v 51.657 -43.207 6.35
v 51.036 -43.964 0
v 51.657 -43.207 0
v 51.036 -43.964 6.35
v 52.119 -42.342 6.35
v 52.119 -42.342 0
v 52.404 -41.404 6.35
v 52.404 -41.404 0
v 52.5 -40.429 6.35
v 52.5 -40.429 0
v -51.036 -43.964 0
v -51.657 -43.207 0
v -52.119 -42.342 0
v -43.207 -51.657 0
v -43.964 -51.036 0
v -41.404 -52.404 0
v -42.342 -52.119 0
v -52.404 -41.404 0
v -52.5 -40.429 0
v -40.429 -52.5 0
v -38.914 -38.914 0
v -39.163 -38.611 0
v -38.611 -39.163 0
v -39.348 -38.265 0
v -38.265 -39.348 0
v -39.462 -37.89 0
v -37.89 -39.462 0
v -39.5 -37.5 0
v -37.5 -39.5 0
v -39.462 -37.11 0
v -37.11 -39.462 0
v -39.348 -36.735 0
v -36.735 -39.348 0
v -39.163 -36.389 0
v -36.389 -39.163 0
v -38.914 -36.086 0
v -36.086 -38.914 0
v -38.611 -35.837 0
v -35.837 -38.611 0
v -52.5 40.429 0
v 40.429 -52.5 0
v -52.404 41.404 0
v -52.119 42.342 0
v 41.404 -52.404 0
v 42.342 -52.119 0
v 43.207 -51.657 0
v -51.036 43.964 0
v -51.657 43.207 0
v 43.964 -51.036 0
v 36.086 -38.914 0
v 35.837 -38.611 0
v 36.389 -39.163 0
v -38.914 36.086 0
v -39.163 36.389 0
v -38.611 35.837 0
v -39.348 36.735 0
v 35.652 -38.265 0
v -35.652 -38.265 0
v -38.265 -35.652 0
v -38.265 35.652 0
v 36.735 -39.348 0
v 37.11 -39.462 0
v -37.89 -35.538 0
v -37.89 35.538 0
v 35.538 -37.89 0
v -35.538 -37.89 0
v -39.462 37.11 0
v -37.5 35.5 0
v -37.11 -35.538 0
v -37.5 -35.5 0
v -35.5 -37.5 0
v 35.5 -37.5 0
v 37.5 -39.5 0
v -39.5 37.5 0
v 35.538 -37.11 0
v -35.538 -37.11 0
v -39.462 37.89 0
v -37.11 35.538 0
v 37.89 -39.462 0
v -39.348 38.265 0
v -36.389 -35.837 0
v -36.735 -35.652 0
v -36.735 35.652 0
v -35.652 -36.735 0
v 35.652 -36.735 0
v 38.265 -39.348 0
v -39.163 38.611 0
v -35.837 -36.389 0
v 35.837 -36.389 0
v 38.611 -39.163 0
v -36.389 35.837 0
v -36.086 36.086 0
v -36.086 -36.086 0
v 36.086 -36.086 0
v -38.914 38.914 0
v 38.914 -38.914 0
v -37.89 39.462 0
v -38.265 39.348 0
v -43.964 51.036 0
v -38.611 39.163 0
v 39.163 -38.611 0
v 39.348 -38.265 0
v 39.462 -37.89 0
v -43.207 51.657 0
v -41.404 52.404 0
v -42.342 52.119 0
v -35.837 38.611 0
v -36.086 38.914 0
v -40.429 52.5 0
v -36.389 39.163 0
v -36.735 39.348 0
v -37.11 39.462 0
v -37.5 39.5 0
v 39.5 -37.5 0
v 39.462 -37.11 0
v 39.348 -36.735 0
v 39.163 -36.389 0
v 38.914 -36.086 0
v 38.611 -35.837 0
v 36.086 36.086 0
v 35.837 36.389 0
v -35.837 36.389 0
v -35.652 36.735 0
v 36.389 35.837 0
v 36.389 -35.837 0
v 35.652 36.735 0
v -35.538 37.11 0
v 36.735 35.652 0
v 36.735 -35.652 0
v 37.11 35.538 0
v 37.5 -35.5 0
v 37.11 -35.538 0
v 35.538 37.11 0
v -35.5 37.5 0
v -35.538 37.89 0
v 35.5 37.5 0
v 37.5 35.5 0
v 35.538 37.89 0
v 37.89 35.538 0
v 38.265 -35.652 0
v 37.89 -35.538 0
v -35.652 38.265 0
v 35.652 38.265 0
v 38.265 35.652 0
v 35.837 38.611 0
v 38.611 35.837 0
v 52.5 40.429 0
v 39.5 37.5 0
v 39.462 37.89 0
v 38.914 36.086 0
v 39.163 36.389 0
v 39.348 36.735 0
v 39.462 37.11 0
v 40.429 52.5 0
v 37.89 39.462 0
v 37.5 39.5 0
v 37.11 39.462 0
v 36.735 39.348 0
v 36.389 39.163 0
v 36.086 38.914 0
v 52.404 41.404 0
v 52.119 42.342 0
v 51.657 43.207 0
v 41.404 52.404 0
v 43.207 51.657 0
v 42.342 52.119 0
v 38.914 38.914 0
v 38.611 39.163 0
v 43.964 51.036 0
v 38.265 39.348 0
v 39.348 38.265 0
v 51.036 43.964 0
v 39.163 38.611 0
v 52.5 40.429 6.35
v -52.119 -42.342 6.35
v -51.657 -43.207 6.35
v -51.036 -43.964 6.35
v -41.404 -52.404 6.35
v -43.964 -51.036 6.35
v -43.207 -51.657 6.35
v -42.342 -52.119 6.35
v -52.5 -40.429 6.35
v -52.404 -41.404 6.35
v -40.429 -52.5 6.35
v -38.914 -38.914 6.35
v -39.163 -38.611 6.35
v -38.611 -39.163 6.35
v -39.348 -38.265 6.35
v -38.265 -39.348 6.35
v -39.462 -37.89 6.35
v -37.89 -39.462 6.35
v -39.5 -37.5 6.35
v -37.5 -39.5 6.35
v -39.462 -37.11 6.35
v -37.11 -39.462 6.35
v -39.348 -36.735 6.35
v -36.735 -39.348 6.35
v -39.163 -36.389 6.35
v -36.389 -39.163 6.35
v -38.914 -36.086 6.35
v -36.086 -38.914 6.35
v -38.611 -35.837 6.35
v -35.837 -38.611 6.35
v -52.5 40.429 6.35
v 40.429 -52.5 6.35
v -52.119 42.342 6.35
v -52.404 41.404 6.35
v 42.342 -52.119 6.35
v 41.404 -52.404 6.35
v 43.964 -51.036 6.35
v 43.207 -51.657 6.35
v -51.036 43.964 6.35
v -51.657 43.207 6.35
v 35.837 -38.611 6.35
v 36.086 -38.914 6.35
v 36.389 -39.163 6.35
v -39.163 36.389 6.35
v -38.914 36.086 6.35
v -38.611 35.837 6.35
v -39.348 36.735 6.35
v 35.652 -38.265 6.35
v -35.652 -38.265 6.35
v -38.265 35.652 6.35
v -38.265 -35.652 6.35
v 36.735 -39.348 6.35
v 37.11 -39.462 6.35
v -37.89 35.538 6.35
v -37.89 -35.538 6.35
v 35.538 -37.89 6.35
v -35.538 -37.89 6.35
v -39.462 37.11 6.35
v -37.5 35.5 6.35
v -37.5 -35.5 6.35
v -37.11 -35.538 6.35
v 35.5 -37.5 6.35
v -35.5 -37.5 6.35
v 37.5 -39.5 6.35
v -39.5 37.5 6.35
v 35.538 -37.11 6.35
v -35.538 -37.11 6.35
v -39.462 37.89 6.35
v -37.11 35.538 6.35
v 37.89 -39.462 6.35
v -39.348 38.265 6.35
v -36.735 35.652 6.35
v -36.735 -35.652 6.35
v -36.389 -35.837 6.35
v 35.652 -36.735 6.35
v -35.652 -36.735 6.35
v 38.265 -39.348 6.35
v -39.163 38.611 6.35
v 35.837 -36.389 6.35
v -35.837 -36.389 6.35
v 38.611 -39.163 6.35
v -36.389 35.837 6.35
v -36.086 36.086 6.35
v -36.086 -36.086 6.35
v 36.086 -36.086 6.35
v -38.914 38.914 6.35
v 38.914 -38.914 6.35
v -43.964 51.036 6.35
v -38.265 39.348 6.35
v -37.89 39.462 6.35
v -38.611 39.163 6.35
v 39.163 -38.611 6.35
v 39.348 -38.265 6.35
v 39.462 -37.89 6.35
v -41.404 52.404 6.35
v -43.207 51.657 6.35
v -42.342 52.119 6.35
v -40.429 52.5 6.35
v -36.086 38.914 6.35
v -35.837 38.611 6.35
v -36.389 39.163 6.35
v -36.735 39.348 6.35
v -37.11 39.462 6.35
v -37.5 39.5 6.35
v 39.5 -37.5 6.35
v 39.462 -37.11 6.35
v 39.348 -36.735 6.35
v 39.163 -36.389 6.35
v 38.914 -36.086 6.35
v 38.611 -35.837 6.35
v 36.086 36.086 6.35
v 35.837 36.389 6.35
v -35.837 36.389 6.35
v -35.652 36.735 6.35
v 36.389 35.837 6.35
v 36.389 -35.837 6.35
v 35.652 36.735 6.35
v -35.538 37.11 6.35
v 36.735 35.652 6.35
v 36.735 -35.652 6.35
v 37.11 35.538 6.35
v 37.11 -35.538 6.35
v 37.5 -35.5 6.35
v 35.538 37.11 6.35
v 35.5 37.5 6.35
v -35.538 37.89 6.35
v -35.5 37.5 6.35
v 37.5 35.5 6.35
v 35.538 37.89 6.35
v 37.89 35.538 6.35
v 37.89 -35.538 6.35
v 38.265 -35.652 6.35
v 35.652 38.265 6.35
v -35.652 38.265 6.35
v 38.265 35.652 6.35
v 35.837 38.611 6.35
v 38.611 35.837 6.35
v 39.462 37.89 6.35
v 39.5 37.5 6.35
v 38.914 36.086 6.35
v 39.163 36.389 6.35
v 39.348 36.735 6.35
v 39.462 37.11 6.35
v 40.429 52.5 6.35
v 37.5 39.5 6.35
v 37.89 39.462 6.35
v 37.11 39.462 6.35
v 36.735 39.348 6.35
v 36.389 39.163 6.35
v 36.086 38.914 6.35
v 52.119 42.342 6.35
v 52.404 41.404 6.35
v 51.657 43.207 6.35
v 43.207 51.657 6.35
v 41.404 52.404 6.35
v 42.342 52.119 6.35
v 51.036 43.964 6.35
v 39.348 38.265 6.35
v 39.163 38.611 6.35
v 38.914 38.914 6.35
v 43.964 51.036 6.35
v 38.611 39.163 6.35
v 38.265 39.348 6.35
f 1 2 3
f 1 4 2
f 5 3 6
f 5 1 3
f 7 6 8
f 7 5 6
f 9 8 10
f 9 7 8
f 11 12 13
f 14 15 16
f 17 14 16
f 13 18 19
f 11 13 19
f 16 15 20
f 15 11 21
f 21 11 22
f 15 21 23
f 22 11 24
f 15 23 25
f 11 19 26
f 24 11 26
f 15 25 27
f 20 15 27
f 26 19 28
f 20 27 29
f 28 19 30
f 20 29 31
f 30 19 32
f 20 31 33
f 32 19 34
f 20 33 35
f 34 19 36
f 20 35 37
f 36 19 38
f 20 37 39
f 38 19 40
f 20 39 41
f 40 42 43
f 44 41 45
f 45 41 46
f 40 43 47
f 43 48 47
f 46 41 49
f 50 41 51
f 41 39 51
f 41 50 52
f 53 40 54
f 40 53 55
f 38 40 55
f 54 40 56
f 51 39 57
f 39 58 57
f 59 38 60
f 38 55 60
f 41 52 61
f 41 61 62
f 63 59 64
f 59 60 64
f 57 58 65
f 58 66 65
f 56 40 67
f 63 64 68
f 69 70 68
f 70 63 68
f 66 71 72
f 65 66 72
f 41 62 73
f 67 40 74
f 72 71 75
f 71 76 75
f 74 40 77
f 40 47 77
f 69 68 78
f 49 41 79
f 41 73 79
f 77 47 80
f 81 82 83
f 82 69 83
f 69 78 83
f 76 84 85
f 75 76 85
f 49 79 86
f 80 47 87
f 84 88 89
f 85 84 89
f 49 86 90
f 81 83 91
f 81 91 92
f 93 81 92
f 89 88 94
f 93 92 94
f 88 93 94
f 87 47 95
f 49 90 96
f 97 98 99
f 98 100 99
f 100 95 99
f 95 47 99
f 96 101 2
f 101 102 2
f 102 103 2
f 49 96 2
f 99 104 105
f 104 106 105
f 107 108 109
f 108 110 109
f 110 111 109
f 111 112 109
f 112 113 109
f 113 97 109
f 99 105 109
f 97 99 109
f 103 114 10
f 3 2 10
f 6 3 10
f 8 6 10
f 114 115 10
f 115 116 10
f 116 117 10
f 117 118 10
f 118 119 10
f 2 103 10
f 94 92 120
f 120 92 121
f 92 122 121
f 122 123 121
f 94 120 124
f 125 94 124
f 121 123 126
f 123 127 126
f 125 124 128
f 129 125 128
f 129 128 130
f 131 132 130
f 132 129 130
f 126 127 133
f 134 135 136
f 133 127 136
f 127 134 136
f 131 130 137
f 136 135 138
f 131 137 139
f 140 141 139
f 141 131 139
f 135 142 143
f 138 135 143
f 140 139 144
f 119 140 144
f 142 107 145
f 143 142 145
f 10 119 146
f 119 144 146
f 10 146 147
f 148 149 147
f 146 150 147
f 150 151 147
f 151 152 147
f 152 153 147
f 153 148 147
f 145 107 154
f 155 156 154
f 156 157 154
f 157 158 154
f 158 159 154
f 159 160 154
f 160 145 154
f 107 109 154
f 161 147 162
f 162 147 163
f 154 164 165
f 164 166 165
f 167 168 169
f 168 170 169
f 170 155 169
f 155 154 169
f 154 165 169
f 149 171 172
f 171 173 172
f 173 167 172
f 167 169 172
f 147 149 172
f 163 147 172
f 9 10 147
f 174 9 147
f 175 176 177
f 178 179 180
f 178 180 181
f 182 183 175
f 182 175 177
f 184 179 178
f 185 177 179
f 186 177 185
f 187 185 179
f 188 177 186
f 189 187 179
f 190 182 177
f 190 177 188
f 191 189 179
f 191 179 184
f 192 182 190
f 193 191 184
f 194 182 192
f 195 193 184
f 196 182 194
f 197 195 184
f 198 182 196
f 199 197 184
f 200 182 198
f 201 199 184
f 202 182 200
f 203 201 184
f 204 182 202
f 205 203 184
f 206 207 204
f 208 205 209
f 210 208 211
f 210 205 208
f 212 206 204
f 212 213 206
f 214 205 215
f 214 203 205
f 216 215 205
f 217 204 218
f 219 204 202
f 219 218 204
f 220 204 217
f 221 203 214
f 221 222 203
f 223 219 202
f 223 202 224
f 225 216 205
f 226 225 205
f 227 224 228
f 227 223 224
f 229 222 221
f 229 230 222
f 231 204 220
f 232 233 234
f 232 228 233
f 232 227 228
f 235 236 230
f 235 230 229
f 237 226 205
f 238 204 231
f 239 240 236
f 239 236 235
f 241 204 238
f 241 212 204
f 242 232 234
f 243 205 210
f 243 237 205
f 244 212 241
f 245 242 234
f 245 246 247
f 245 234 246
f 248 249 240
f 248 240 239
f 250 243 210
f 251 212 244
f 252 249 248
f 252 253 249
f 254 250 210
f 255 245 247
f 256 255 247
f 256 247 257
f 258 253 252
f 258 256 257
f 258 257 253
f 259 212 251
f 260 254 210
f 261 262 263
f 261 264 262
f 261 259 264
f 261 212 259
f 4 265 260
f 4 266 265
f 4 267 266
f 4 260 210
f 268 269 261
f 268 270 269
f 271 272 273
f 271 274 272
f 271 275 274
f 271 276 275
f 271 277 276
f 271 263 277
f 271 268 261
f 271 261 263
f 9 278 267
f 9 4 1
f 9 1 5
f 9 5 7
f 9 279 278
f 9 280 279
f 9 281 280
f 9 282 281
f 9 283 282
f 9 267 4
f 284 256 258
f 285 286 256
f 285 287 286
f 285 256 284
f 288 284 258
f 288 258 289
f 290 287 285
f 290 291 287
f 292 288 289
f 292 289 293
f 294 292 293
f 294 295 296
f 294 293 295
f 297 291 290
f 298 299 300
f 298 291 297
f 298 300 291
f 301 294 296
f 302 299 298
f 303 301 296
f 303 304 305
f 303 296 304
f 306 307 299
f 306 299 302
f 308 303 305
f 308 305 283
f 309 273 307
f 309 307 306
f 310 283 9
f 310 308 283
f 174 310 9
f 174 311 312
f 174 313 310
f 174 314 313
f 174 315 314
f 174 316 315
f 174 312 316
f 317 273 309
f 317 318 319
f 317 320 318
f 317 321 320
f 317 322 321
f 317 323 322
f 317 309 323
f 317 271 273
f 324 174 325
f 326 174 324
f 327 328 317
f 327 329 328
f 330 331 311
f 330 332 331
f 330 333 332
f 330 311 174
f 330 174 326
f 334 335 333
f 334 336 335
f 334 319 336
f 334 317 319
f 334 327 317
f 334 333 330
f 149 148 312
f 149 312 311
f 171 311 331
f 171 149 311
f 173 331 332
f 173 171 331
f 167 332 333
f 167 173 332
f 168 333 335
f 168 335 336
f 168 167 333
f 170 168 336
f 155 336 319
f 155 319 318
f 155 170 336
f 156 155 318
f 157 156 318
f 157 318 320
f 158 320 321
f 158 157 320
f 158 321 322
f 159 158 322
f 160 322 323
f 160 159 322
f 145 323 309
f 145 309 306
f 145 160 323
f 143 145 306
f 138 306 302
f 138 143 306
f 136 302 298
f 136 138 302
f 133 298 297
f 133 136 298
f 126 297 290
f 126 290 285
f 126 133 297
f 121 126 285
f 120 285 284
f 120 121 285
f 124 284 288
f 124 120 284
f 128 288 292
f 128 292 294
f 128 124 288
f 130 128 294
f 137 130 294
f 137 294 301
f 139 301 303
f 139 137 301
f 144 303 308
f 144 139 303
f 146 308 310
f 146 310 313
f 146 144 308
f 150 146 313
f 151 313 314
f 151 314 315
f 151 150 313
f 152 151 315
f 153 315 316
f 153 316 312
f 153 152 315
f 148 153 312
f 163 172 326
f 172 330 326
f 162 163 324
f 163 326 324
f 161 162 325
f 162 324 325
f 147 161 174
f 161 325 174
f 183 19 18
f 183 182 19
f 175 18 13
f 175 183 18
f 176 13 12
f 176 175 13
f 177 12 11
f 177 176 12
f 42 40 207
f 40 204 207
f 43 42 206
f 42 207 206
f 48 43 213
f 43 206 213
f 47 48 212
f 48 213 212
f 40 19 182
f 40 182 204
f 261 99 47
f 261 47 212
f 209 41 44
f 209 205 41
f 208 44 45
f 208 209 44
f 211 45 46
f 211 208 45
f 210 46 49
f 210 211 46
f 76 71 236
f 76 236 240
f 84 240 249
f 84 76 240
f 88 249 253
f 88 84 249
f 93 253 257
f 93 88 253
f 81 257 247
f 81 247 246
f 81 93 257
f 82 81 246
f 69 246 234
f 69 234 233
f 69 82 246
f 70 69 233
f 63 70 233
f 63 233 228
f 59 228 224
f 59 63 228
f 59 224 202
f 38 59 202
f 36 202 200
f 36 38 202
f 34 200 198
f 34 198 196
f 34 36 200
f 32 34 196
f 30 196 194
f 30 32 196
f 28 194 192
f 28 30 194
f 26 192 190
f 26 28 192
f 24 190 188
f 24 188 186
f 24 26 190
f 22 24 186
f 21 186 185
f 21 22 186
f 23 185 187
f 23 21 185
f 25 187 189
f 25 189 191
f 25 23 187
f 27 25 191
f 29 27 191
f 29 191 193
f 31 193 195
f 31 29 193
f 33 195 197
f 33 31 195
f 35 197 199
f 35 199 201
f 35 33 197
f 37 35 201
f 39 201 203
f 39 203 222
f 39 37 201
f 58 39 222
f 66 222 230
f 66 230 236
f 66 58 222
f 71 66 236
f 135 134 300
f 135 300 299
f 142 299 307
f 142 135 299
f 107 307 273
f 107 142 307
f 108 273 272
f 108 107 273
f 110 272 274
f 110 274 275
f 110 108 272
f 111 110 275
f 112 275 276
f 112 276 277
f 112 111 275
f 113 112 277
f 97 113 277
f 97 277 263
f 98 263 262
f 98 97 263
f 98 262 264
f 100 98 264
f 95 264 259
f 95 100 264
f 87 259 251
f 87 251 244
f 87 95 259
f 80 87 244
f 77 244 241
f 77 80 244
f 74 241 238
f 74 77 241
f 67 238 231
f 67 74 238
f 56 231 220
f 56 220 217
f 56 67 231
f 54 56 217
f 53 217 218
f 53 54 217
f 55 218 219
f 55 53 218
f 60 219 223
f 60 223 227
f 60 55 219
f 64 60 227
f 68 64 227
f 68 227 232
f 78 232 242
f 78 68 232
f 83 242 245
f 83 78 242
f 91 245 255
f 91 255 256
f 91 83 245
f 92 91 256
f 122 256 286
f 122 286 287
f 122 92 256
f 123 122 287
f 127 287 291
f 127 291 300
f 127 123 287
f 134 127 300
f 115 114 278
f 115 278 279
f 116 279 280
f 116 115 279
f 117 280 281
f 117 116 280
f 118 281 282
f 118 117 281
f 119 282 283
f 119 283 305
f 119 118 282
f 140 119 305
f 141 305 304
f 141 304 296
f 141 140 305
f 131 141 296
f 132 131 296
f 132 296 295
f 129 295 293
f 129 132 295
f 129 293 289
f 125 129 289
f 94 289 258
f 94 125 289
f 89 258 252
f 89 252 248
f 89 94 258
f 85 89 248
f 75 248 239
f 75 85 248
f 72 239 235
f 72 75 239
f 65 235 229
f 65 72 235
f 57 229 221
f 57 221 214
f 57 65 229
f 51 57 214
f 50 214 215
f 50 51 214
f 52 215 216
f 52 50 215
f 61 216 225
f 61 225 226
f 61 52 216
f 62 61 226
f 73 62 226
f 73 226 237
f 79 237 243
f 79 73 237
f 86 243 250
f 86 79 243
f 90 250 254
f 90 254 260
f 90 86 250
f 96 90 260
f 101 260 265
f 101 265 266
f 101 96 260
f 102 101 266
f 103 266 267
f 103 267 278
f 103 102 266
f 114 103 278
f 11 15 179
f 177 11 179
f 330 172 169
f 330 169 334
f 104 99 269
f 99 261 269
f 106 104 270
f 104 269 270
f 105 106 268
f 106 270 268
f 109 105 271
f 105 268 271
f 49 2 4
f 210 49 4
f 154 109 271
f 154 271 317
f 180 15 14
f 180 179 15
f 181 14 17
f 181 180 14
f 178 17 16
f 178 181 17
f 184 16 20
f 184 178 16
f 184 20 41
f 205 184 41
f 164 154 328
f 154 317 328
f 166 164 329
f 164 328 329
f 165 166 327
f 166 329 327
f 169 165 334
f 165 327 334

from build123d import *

# Parameters (mm, degrees)
F0_W     = 105
F0_H     = 105
F0_R     = 2
F1_DEPTH = 6.35
F2_SIZE  = 10
F3_R     = 5


# Not quite as in the source:
# - a length typed as a fraction of an inch, garbled in the dataset ("3 / 203.2 mm" for 3/8 in), is restored


with BuildPart() as f1:
    # F0 (on Top) → F1 (new body)
    with BuildSketch(Plane.XY):
        Rectangle(F0_W, F0_H)
        with Locations((-37.5, -37.5)):
            Circle(F0_R, mode=Mode.SUBTRACT)
        with Locations((37.5, -37.5)):
            Circle(F0_R, mode=Mode.SUBTRACT)
        with Locations((-37.5, 37.5)):
            Circle(F0_R, mode=Mode.SUBTRACT)
        with Locations((37.5, 37.5)):
            Circle(F0_R, mode=Mode.SUBTRACT)
    extrude(amount=F1_DEPTH)

    # F2
    f2_edges = [f1.edges().sort_by_distance(p)[0] for p in [
        (-52.5, -52.5, 3.175),
        (52.5, -52.5, 3.175),
        (52.5, 52.5, 3.175),
        (-52.5, 52.5, 3.175),
    ]]
    chamfer(f2_edges, length=F2_SIZE)

    # F3
    f3_edges = [f1.edges().sort_by_distance(p)[0] for p in [
        (52.5, 42.5, 3.175),
        (42.5, 52.5, 3.175),
        (-42.5, 52.5, 3.175),
        (-52.5, 42.5, 3.175),
        (-52.5, -42.5, 3.175),
        (-42.5, -52.5, 3.175),
        (42.5, -52.5, 3.175),
        (52.5, -42.5, 3.175),
    ]]
    fillet(f3_edges, radius=F3_R)


solid = f1.part
